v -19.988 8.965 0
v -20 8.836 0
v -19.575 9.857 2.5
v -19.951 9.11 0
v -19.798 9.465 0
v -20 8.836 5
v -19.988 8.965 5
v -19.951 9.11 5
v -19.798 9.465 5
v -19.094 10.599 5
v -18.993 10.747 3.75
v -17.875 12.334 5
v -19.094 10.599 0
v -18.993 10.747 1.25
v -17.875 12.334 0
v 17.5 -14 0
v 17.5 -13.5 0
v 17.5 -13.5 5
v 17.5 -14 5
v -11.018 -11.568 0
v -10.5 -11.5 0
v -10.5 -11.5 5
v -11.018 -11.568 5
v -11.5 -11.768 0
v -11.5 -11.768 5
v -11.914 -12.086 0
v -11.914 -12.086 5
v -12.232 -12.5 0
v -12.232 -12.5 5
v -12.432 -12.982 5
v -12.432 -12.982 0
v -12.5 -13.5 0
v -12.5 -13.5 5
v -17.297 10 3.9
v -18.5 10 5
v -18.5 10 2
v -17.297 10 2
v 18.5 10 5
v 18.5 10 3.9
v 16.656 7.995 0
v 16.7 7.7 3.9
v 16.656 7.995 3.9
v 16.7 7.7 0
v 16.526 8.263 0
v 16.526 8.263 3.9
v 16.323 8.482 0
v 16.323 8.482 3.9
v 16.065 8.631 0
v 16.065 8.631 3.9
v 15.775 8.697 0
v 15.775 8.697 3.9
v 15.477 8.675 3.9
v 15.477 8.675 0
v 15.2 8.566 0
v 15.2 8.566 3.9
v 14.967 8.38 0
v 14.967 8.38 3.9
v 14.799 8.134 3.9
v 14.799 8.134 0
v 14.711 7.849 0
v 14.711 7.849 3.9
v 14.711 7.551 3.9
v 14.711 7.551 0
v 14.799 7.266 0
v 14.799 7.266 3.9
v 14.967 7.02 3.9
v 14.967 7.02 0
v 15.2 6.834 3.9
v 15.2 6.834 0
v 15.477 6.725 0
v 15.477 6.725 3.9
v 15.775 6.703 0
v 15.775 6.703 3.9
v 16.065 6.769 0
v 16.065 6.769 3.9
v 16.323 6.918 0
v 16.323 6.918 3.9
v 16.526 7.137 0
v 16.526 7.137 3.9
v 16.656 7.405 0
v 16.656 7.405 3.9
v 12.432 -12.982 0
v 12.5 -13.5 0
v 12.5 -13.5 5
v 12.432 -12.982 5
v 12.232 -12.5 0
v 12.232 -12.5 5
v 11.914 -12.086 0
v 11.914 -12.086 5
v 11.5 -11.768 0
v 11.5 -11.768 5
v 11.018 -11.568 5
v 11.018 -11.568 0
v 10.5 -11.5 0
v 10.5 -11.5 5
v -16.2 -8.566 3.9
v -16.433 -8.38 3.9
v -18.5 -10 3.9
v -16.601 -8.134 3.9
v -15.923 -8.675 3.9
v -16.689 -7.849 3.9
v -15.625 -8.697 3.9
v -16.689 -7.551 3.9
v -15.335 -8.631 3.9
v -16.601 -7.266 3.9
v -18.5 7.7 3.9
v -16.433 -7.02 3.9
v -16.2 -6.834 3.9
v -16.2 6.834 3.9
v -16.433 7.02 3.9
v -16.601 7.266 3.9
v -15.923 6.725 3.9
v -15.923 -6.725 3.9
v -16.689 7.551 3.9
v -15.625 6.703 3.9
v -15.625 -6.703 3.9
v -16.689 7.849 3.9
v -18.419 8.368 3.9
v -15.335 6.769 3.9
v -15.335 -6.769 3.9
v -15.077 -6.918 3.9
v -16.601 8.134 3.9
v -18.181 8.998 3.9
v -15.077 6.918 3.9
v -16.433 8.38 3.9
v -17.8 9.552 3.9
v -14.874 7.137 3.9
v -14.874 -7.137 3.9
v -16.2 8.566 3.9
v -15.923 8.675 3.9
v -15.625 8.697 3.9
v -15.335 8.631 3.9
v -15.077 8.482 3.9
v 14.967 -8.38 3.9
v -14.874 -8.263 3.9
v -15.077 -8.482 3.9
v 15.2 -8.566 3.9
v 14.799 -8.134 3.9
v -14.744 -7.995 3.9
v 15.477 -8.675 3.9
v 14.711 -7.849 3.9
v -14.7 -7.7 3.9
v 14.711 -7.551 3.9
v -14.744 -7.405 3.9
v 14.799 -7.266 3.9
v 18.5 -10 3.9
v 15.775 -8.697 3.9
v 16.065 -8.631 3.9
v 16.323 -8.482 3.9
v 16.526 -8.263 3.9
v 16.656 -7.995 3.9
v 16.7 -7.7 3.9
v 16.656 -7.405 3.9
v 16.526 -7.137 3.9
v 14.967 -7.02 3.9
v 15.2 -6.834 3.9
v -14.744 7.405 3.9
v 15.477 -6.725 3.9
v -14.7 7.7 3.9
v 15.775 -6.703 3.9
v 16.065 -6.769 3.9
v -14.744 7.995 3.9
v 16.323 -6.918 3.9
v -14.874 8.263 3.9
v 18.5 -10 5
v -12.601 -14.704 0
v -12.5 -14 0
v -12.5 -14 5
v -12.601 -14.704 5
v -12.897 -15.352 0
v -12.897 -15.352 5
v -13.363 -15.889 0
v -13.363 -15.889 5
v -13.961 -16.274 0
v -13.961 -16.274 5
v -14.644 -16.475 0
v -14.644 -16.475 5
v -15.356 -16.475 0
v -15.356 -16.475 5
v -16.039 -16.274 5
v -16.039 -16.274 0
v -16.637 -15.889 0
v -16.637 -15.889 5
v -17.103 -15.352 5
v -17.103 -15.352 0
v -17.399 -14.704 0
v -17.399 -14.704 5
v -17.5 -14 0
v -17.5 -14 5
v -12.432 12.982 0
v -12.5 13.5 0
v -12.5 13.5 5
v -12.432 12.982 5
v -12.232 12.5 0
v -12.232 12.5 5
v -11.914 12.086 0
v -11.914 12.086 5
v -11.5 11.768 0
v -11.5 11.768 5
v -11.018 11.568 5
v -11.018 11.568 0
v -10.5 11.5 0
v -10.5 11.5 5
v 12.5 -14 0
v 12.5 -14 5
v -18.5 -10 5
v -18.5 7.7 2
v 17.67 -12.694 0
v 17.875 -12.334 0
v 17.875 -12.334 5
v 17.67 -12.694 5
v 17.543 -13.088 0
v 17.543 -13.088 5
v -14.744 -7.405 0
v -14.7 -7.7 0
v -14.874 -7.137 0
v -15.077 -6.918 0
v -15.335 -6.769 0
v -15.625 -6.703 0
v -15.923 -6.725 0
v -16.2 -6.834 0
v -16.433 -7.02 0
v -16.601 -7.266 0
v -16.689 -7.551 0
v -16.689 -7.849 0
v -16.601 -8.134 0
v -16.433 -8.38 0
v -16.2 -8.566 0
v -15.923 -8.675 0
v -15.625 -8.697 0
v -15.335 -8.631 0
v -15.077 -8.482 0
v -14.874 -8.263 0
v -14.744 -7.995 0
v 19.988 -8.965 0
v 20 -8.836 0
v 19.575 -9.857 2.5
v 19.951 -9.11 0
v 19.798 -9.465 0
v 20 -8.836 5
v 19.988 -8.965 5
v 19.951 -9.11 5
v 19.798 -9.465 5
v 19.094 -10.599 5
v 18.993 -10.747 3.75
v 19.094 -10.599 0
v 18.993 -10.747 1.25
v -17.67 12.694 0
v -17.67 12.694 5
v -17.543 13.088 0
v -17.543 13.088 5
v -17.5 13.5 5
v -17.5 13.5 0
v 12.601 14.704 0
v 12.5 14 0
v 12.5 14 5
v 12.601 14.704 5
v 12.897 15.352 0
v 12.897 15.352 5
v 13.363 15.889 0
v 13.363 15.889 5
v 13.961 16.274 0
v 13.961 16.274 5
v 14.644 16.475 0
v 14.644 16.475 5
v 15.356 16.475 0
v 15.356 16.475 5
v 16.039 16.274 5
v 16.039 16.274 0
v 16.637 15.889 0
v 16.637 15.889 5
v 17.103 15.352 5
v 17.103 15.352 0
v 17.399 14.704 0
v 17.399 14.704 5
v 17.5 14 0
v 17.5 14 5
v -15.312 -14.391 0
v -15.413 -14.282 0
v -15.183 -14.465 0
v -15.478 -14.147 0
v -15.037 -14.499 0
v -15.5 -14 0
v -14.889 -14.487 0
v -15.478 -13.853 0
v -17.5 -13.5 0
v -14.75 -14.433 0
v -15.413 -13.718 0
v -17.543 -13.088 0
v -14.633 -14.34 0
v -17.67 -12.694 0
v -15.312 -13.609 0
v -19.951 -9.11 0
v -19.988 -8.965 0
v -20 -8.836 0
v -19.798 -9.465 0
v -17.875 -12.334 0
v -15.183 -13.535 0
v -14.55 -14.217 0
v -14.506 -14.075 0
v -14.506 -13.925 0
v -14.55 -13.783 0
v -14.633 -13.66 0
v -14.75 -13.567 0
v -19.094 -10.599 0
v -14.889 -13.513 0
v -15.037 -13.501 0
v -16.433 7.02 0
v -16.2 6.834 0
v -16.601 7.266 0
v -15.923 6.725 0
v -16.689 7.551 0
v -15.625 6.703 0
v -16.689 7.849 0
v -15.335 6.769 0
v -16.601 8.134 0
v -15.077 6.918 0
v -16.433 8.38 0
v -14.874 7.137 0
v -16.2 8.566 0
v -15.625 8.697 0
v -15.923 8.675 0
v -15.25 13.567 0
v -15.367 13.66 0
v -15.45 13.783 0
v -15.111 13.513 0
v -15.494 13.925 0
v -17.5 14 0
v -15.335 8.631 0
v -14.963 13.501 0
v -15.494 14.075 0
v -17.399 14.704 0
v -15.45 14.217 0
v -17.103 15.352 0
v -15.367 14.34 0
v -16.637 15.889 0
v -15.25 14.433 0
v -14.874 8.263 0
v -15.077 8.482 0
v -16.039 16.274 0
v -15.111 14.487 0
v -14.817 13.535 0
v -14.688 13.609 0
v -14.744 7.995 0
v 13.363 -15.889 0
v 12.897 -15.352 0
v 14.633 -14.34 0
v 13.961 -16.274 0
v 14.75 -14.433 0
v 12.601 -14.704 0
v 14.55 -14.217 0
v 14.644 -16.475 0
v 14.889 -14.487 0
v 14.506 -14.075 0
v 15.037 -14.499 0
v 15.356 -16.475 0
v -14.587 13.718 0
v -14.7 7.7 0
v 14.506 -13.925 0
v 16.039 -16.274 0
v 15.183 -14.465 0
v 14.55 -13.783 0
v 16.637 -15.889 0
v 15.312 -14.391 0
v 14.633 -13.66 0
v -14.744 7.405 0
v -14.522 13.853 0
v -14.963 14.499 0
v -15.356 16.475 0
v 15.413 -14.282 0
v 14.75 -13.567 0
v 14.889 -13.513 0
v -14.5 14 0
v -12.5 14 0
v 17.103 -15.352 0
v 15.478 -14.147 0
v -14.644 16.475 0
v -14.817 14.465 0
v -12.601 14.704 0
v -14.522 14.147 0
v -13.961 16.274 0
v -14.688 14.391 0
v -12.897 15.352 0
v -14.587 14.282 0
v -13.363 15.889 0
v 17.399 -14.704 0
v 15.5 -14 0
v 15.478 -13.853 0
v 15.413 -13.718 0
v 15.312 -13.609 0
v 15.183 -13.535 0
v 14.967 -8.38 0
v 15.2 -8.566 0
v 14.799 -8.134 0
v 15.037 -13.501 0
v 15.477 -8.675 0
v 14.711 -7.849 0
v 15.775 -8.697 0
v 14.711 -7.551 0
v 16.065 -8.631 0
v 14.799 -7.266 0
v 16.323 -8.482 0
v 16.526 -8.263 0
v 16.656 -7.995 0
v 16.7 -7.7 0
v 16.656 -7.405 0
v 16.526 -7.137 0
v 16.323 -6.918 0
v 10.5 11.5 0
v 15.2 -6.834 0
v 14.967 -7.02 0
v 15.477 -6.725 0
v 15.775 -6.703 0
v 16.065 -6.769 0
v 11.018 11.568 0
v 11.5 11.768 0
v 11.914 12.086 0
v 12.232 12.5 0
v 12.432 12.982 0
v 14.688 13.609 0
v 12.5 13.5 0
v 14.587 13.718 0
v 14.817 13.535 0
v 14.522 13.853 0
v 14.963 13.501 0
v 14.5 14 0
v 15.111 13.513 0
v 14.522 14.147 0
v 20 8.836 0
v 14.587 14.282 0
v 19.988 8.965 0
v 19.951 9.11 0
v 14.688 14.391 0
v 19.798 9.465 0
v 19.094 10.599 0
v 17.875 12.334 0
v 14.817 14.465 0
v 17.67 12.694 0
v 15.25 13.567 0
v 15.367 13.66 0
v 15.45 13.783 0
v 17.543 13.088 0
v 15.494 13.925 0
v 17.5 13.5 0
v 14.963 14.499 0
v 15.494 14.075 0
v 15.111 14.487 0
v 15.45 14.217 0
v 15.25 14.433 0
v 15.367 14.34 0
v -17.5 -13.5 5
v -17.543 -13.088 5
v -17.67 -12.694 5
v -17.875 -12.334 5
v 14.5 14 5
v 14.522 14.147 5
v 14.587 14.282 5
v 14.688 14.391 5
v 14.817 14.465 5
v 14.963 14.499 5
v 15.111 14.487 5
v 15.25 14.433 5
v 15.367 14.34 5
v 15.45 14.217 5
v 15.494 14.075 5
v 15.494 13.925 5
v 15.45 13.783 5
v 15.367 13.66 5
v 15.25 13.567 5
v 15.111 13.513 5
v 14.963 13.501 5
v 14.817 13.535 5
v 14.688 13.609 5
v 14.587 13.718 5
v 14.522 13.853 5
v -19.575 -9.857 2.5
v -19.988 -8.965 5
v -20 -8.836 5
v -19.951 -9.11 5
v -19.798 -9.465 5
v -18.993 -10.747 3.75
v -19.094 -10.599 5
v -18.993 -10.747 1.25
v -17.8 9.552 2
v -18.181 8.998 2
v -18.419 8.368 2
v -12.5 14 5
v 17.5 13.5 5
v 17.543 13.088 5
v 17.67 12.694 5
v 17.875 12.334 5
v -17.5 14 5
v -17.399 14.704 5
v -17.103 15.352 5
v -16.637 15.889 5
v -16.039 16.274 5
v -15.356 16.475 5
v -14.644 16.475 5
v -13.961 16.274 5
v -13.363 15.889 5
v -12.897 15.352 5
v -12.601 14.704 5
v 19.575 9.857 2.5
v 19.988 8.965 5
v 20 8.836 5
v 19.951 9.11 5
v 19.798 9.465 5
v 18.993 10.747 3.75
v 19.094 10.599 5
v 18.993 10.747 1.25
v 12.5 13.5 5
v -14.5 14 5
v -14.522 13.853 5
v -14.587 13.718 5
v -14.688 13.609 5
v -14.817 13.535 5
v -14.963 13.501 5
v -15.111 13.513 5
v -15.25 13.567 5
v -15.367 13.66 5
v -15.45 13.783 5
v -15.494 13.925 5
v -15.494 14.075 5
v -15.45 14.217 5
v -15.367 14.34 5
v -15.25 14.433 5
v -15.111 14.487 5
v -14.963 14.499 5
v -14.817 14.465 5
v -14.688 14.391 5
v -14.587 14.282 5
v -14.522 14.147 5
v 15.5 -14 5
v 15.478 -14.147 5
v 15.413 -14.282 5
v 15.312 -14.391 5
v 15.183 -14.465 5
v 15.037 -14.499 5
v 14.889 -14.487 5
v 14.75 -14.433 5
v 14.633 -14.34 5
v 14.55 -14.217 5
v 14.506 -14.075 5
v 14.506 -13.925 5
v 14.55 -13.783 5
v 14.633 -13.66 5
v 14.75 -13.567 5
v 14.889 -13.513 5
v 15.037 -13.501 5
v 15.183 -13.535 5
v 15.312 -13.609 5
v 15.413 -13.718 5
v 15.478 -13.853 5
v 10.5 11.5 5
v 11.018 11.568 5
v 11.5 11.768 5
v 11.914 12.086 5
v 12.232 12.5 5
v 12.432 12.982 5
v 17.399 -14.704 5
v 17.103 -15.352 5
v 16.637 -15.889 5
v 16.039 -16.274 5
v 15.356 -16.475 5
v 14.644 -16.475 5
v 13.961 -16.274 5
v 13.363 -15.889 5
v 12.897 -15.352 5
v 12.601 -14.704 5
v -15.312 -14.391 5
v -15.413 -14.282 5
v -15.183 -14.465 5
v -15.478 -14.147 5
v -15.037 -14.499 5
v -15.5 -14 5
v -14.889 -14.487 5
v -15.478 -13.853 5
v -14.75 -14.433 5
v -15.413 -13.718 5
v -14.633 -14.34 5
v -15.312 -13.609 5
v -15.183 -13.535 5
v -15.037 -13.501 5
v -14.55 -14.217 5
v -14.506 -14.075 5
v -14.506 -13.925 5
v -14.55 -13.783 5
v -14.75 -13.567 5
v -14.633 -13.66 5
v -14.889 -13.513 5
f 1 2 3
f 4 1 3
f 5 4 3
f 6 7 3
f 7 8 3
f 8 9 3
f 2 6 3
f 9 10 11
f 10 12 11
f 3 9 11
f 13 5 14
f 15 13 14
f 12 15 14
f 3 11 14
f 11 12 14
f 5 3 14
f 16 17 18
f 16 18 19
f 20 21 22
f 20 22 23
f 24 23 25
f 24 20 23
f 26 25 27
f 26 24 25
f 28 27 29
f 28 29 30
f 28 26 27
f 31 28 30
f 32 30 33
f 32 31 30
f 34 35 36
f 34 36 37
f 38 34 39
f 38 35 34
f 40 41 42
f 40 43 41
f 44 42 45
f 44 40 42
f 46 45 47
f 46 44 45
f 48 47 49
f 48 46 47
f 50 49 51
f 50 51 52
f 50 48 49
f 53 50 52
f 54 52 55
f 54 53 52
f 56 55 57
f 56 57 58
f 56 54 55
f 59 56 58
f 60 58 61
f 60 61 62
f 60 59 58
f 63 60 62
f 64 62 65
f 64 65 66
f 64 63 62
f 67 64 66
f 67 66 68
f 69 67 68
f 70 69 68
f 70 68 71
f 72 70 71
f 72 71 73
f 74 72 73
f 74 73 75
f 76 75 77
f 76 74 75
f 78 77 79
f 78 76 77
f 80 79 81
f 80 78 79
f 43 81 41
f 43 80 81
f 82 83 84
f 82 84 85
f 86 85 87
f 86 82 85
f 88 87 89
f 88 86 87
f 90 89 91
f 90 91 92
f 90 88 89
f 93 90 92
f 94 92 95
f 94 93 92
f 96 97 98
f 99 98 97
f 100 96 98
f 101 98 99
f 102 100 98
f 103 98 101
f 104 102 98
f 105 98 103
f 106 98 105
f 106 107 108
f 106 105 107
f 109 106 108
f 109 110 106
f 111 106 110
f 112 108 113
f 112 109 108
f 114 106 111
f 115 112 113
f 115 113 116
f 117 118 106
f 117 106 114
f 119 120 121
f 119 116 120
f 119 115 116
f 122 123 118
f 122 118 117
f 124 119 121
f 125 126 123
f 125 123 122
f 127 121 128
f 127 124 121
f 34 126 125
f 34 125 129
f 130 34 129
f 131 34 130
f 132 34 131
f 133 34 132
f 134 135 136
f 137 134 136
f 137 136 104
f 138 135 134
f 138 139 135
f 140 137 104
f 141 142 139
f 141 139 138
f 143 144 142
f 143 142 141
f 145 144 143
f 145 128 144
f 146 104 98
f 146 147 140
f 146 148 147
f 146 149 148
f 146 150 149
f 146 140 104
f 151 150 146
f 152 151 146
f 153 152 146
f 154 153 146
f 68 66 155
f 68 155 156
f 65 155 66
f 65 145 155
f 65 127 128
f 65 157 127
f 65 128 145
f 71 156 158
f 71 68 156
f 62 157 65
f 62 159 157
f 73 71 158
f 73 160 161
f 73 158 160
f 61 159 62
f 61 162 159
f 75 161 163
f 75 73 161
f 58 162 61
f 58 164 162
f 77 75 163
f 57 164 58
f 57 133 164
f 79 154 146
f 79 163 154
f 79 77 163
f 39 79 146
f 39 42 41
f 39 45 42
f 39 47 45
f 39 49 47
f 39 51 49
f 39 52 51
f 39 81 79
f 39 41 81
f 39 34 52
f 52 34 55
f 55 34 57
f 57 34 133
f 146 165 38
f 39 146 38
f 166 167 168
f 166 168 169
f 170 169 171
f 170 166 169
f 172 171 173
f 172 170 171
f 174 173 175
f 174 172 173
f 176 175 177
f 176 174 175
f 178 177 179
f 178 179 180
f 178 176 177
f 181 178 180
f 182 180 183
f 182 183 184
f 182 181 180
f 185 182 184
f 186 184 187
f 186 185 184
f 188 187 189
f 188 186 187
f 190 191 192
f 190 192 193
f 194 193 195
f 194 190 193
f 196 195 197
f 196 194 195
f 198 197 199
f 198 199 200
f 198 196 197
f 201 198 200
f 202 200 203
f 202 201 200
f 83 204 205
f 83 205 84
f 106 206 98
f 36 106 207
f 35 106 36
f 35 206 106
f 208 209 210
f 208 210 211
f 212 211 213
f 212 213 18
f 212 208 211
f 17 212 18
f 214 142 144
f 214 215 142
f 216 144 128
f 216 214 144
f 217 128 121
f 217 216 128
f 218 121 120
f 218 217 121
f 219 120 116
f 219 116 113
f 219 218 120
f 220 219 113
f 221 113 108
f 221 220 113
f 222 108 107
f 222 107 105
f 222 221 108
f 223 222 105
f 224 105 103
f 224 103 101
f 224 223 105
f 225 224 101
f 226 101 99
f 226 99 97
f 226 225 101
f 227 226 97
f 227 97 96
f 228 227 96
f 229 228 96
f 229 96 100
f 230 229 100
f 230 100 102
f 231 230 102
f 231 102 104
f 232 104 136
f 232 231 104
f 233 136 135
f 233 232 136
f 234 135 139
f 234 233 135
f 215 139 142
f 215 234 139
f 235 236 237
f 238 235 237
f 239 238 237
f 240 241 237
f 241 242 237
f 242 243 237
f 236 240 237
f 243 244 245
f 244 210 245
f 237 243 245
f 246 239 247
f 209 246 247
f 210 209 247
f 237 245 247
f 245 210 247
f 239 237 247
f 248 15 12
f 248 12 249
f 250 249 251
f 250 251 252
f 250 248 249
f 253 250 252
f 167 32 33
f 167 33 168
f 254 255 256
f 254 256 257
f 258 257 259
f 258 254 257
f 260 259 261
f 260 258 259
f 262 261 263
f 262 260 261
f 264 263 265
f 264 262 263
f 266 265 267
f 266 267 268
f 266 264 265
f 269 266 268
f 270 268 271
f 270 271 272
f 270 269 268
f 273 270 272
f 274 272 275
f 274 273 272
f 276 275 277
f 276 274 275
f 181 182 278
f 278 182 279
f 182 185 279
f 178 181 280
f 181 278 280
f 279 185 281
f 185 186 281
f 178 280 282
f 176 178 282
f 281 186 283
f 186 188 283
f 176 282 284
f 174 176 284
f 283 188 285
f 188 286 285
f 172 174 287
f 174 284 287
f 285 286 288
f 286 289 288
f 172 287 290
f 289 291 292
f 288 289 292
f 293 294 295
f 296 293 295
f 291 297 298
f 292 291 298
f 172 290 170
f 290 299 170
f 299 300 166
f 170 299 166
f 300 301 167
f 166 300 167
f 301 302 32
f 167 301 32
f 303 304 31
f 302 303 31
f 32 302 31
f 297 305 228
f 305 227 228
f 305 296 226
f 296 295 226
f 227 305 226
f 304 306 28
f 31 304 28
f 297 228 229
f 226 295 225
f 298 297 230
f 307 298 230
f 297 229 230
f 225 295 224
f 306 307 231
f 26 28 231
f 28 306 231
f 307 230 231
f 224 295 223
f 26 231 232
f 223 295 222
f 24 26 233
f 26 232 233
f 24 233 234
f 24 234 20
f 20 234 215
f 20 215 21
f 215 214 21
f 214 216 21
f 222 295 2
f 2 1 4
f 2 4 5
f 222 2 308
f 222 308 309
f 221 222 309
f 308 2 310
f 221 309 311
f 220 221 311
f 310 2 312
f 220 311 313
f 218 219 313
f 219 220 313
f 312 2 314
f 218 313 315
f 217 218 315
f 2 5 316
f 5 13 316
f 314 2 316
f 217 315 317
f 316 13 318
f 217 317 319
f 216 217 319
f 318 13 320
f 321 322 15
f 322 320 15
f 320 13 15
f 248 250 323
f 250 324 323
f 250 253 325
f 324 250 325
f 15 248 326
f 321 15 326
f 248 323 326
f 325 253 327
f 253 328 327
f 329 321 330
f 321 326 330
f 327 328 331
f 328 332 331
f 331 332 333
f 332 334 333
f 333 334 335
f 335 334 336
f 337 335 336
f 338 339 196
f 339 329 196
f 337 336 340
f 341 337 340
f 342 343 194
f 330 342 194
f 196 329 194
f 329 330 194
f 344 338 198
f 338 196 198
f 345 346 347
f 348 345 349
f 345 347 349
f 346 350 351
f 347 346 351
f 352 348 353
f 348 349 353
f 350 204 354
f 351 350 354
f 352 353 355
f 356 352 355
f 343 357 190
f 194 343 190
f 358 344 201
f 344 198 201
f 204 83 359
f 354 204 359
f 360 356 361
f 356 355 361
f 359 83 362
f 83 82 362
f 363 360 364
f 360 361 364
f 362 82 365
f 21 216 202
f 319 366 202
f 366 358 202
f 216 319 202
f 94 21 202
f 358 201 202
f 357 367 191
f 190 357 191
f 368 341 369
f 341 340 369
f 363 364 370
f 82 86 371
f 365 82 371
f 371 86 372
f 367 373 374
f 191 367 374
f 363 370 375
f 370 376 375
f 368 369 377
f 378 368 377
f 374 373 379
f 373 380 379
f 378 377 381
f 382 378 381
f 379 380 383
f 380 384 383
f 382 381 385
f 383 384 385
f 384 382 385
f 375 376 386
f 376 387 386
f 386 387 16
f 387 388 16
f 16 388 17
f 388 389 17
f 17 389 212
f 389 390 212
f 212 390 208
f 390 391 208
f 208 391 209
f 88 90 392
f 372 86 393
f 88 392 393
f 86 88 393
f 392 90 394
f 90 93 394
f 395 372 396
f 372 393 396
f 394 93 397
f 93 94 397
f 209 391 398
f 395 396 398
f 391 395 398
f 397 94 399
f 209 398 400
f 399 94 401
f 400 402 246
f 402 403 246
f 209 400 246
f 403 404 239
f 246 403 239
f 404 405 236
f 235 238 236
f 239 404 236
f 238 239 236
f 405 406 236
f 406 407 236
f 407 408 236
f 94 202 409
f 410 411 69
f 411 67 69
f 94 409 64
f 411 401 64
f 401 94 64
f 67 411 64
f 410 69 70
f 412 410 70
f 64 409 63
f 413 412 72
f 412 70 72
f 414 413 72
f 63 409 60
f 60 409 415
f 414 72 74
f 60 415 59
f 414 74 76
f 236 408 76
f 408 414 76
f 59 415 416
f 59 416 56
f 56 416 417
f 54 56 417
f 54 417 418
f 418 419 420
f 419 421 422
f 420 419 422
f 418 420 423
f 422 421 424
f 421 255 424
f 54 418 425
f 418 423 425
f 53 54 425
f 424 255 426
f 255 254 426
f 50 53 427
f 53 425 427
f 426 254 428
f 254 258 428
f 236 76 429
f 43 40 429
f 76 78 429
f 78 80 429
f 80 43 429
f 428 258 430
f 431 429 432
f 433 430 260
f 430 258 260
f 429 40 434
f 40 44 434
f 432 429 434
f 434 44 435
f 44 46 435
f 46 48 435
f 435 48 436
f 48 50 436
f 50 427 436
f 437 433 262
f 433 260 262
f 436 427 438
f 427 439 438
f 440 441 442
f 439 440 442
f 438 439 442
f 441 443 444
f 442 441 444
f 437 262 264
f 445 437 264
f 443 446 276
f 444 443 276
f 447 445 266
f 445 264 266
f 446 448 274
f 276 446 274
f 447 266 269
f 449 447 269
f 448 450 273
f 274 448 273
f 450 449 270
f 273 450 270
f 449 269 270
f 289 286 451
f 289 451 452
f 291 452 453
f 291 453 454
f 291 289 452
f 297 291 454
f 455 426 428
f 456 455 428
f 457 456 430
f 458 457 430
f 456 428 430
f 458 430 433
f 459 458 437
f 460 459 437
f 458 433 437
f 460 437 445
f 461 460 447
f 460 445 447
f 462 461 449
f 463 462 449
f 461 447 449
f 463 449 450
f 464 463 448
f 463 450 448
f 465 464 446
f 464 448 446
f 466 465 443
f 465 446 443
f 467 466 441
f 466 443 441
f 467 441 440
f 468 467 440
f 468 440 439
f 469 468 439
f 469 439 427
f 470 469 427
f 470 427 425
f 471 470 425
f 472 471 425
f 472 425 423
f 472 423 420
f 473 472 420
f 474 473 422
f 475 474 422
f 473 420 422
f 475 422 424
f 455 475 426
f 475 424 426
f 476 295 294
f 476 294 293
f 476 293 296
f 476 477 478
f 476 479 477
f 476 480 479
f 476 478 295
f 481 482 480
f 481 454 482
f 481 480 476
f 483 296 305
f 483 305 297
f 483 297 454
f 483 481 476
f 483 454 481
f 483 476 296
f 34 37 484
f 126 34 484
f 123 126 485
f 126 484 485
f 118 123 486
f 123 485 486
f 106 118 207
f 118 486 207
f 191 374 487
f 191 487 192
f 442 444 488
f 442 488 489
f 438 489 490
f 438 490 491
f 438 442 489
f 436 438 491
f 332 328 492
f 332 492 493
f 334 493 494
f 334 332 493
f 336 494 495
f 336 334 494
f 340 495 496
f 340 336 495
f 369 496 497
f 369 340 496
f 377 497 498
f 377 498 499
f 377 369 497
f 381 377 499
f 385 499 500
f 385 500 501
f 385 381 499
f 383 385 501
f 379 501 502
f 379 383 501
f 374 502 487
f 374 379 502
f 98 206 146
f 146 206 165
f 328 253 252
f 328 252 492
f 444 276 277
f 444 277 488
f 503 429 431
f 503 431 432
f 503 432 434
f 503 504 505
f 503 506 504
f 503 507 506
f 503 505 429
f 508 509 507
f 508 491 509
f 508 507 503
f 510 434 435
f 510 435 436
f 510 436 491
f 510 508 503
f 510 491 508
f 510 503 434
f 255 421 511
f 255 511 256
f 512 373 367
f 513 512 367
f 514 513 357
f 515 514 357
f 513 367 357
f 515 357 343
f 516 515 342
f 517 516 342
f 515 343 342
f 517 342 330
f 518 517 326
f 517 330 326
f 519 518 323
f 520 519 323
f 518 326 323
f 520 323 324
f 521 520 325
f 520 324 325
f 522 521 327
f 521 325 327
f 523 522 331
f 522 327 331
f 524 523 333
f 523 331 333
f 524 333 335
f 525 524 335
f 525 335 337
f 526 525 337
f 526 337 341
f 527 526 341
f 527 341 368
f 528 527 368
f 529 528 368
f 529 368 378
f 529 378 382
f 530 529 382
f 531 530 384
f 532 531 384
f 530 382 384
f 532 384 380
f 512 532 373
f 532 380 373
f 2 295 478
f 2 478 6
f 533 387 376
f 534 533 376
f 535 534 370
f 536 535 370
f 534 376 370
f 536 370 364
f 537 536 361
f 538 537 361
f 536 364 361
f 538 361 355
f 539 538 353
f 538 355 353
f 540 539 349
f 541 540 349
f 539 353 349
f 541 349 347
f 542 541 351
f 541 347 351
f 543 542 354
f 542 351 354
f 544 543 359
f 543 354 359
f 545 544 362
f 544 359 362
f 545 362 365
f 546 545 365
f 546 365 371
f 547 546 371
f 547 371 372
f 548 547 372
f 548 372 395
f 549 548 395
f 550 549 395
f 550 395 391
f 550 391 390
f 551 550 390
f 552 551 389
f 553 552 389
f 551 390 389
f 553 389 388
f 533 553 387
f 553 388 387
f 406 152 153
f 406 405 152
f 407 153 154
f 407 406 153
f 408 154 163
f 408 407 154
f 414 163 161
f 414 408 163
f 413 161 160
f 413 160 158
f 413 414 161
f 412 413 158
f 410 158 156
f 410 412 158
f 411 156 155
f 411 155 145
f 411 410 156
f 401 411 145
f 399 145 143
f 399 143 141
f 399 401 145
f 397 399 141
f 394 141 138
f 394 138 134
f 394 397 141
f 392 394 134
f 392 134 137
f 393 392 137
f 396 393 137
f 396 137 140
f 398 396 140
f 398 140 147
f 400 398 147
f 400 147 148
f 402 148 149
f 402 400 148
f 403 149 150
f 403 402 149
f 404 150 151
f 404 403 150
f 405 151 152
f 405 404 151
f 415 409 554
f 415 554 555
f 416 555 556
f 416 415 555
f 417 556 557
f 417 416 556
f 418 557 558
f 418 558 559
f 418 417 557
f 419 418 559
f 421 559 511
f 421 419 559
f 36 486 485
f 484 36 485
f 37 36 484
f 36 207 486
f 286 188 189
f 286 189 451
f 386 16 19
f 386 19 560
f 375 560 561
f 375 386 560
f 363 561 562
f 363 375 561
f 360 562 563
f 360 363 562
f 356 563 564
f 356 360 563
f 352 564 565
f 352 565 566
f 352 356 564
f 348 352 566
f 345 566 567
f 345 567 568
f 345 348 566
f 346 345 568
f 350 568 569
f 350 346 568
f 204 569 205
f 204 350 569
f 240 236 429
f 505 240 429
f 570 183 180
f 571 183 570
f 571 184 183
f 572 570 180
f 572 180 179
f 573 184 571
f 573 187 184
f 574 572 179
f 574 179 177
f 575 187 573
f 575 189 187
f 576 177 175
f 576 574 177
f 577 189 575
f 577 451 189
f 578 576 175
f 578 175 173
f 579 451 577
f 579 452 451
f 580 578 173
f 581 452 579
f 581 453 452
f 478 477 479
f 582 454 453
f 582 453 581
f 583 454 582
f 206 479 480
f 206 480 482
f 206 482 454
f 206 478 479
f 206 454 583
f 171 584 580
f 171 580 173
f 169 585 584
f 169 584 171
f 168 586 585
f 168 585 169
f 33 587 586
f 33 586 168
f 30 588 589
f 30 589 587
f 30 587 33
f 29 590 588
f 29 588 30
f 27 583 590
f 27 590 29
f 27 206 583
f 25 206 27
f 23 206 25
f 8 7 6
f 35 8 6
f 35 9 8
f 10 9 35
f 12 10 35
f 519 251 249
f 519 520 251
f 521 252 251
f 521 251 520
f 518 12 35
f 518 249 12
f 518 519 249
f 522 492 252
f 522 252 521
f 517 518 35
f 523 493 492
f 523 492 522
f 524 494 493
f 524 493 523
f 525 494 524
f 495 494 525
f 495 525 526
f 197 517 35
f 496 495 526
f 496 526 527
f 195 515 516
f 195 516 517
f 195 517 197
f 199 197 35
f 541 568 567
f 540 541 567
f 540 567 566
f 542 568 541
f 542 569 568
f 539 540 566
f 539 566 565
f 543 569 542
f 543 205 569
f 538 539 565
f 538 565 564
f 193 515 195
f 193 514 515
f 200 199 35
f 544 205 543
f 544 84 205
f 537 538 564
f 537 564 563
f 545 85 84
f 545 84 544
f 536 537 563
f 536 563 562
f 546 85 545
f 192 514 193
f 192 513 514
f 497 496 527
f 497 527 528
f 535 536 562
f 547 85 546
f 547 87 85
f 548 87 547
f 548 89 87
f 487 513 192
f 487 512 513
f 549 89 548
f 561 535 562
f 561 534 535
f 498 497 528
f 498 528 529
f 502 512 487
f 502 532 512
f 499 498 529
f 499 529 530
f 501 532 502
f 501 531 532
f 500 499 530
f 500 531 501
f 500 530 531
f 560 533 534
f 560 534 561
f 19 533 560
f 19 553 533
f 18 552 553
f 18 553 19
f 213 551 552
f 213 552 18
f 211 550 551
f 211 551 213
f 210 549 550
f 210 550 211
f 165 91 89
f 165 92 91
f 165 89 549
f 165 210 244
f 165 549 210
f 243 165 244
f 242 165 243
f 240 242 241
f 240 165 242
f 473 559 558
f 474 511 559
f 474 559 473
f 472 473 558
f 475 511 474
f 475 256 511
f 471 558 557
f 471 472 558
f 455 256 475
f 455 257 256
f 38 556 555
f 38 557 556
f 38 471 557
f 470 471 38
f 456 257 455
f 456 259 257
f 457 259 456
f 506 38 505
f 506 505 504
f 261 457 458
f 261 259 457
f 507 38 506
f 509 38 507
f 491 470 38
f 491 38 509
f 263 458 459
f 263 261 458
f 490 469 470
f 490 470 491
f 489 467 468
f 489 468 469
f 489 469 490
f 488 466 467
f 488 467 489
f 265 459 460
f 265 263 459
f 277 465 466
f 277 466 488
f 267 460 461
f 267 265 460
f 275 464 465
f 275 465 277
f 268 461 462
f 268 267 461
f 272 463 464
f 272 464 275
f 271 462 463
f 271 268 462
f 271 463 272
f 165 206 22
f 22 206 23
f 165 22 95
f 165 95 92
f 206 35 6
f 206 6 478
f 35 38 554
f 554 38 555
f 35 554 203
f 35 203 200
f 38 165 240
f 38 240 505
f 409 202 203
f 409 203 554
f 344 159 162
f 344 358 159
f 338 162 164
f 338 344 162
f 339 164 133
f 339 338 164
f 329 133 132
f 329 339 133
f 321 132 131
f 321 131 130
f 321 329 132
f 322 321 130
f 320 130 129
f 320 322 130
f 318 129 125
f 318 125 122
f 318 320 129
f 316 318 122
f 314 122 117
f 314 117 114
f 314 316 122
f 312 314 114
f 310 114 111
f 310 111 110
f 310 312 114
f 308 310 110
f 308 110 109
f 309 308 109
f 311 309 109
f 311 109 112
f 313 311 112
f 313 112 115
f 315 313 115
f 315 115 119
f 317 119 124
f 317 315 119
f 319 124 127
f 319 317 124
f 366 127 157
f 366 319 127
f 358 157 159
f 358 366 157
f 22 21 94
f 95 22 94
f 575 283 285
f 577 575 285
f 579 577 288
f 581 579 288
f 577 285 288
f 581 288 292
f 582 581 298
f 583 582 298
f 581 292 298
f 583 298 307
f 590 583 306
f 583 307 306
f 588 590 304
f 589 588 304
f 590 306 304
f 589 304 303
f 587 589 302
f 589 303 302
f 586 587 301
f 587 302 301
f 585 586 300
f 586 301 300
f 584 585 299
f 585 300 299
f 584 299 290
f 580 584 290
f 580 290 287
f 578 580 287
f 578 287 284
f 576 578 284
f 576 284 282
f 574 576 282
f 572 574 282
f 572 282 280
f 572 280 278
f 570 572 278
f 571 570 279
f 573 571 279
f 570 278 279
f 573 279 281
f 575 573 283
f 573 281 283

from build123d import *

# Parameters (mm, degrees)
SKETCH_2_W             = 40
SKETCH_2_H             = 23
SKETCH_2_R             = 1
EXTRUDE_1815_DEPTH     = 5
SKETCH_3_W             = 37
SKETCH_3_H             = 20
CUT_EXTRUDE_2215_DEPTH = 3
SKETCH_4_R             = 1
EXTRUDE_2889_DEPTH     = 1.9
SKETCH_10_R            = 0.5
EXTRUDE_4733_DEPTH     = 5
FILLET_START           = -1
FILLET_5_DEPTH         = 7
FILLET_6_DEPTH         = 7
CUT_EXTRUDE_7304_DEPTH = 1.1


with BuildPart() as part:
    # Эскиз2 → Extrude 1815 (new body)
    with BuildSketch(Plane.XY):
        Rectangle(SKETCH_2_W, SKETCH_2_H)
        with Locations((15.7, -7.7)):
            Circle(SKETCH_2_R, mode=Mode.SUBTRACT)
        with Locations((-15.7, 7.7)):
            Circle(SKETCH_2_R, mode=Mode.SUBTRACT)
        with Locations((15.7, 7.7)):
            Circle(SKETCH_2_R, mode=Mode.SUBTRACT)
        with Locations((-15.7, -7.7)):
            Circle(SKETCH_2_R, mode=Mode.SUBTRACT)
    extrude(amount=EXTRUDE_1815_DEPTH)

    # Эскиз3 → Cut-Extrude 2215 (cut)
    with BuildSketch(Plane.XY.offset(5)):
        Rectangle(SKETCH_3_W, SKETCH_3_H)
    extrude(amount=-CUT_EXTRUDE_2215_DEPTH, mode=Mode.SUBTRACT)

    # Эскиз4 → Extrude 2889 (add)
    with BuildSketch(Plane.XY.offset(2)):
        with BuildLine():
            ThreePointArc((-17.296871942, 10), (-18.181052341, 8.997836384), (-18.5, 7.7))
            Line((-18.5, 7.7), (-18.5, -10))
            Line((-18.5, -10), (18.5, -10))
            Line((18.5, -10), (18.5, 10))
            Line((18.5, 10), (-17.296871942, 10))
        make_face()
        with Locations((-15.7, 7.7)):
            Circle(SKETCH_4_R, mode=Mode.SUBTRACT)
        with Locations((15.7, -7.7)):
            Circle(SKETCH_4_R, mode=Mode.SUBTRACT)
        with Locations((15.7, 7.7)):
            Circle(SKETCH_4_R, mode=Mode.SUBTRACT)
        with Locations((-15.7, -7.7)):
            Circle(SKETCH_4_R, mode=Mode.SUBTRACT)
    extrude(amount=EXTRUDE_2889_DEPTH)

    # Эскиз10 → Extrude 4733 (add)
    # profile 1 of 4: a face of its own
    with BuildSketch(Plane(origin=(0, 0, 0), x_dir=(-1, 0, 0), z_dir=(0, 0, -1))):
        with BuildLine():
            Line((-17.5, 14), (-17.5, 13.5))
            ThreePointArc((-17.5, 13.5), (-18.085786438, 12.085786438), (-19.5, 11.5))
            Line((-19.5, 11.5), (-10.5, 11.5))
            ThreePointArc((-10.5, 11.5), (-11.914213562, 12.085786438), (-12.5, 13.5))
            Line((-12.5, 13.5), (-12.5, 14))
            ThreePointArc((-12.5, 14), (-15, 16.5), (-17.5, 14))
        make_face()
        with Locations((-15, 14)):
            Circle(SKETCH_10_R, mode=Mode.SUBTRACT)
    # profile 2 of 4: a face of its own
    with BuildSketch(Plane(origin=(0, 0, 0), x_dir=(-1, 0, 0), z_dir=(0, 0, -1))):
        with BuildLine():
            Line((10.5, 11.5), (19.5, 11.5))
            ThreePointArc((19.5, 11.5), (18.085786438, 12.085786438), (17.5, 13.5))
            Line((17.5, 13.5), (17.5, 14))
            ThreePointArc((17.5, 14), (15, 16.5), (12.5, 14))
            Line((12.5, 14), (12.5, 13.5))
            ThreePointArc((12.5, 13.5), (11.914213562, 12.085786438), (10.5, 11.5))
        make_face()
        with Locations(Location((15, 14, 0), (0, 0, 180))):
            Circle(SKETCH_10_R, mode=Mode.SUBTRACT)
    # profile 3 of 4: a face of its own
    with BuildSketch(Plane(origin=(0, 0, 0), x_dir=(-1, 0, 0), z_dir=(0, 0, -1))):
        with BuildLine():
            Line((17.5, -14), (17.5, -13.5))
            ThreePointArc((17.5, -13.5), (18.085786438, -12.085786438), (19.5, -11.5))
            Line((19.5, -11.5), (10.5, -11.5))
            ThreePointArc((10.5, -11.5), (11.914213562, -12.085786438), (12.5, -13.5))
            Line((12.5, -13.5), (12.5, -14))
            ThreePointArc((12.5, -14), (15, -16.5), (17.5, -14))
        make_face()
        with Locations((15, -14)):
            Circle(SKETCH_10_R, mode=Mode.SUBTRACT)
    # profile 4 of 4: a face of its own
    with BuildSketch(Plane(origin=(0, 0, 0), x_dir=(-1, 0, 0), z_dir=(0, 0, -1))):
        with BuildLine():
            Line((-10.5, -11.5), (-19.5, -11.5))
            ThreePointArc((-19.5, -11.5), (-18.085786438, -12.085786438), (-17.5, -13.5))
            Line((-17.5, -13.5), (-17.5, -14))
            ThreePointArc((-17.5, -14), (-15, -16.5), (-12.5, -14))
            Line((-12.5, -14), (-12.5, -13.5))
            ThreePointArc((-12.5, -13.5), (-11.914213562, -12.085786438), (-10.5, -11.5))
        make_face()
        with Locations(Location((-15, -14, 0), (0, 0, 180))):
            Circle(SKETCH_10_R, mode=Mode.SUBTRACT)
    extrude(amount=-EXTRUDE_4733_DEPTH)

    # Скругление5: read off the stored shape, not the designer's step
    # Скругление5 outline → Скругление5 (cut)
    with BuildSketch(Plane.XY.offset(FILLET_START)):
        with BuildLine():
            ThreePointArc((19.5, 11.5), (18.5867215, 11.720696097), (17.875, 12.334077619))
            add(Edge.make_bspline(
                [(17.875, 12.334077619), (20, 9.372366741), (20, 8.836310473)],
                knots=[0, 0, 0, 1, 1, 1], degree=2, weights=[1, 1.5, 1]))
            Line((20, 8.836310473), (20, 11.5))
            Line((20, 11.5), (19.5, 11.5))
        make_face()
        with BuildLine():
            ThreePointArc((-19.5, -11.5), (-18.5867215, -11.720696097), (-17.875, -12.334077619))
            add(Edge.make_bspline(
                [(-17.875, -12.334077619), (-20, -9.372366741), (-20, -8.836310473)],
                knots=[0, 0, 0, 1, 1, 1], degree=2, weights=[1, 1.5, 1]))
            Line((-20, -8.836310473), (-20, -11.5))
            Line((-20, -11.5), (-19.5, -11.5))
        make_face()
    extrude(amount=FILLET_5_DEPTH, mode=Mode.SUBTRACT)

    # Скругление6: read off the stored shape, not the designer's step
    # Скругление6 outline → Скругление6 (cut)
    with BuildSketch(Plane.XY.offset(FILLET_START)):
        with BuildLine():
            add(Edge.make_bspline(
                [(-17.875, 12.334077618), (-20, 9.372366741), (-20, 8.836310473)],
                knots=[0, 0, 0, 1, 1, 1], degree=2, weights=[1, 1.5, 1]))
            ThreePointArc((-17.875, 12.334077618), (-18.5867215, 11.720696097), (-19.5, 11.5))
            Line((-19.5, 11.5), (-20, 11.5))
            Line((-20, 11.5), (-20, 8.836310473))
        make_face()
        with BuildLine():
            add(Edge.make_bspline(
                [(17.875, -12.334077618), (20, -9.372366741), (20, -8.836310473)],
                knots=[0, 0, 0, 1, 1, 1], degree=2, weights=[1, 1.5, 1]))
            ThreePointArc((17.875, -12.334077618), (18.5867215, -11.720696097), (19.5, -11.5))
            Line((19.5, -11.5), (20, -11.5))
            Line((20, -11.5), (20, -8.836310473))
        make_face()
    extrude(amount=FILLET_6_DEPTH, mode=Mode.SUBTRACT)

    # Эскиз12 → Cut-Extrude 7304 (cut)
    with BuildSketch(Plane.XY.offset(5)):
        with BuildLine():
            Line((-5.593541674, 13.75), (-10.5, 13.75))
            ThreePointArc((-10.5, 13.75), (-11.076220456, 13.834805496), (-11.60357425, 14.082030014))
            ThreePointArc((-11.60357425, 14.082030014), (-8.693066451, 12.205329008), (-5.593541674, 13.75))
        make_face()
        with BuildLine():
            Line((3.993541674, -13.75), (9.806458326, -13.75))
            ThreePointArc((9.806458326, -13.75), (6.9, -12.2), (3.993541674, -13.75))
        make_face()
    extrude(amount=-CUT_EXTRUDE_7304_DEPTH, mode=Mode.SUBTRACT)


solid = part.part
